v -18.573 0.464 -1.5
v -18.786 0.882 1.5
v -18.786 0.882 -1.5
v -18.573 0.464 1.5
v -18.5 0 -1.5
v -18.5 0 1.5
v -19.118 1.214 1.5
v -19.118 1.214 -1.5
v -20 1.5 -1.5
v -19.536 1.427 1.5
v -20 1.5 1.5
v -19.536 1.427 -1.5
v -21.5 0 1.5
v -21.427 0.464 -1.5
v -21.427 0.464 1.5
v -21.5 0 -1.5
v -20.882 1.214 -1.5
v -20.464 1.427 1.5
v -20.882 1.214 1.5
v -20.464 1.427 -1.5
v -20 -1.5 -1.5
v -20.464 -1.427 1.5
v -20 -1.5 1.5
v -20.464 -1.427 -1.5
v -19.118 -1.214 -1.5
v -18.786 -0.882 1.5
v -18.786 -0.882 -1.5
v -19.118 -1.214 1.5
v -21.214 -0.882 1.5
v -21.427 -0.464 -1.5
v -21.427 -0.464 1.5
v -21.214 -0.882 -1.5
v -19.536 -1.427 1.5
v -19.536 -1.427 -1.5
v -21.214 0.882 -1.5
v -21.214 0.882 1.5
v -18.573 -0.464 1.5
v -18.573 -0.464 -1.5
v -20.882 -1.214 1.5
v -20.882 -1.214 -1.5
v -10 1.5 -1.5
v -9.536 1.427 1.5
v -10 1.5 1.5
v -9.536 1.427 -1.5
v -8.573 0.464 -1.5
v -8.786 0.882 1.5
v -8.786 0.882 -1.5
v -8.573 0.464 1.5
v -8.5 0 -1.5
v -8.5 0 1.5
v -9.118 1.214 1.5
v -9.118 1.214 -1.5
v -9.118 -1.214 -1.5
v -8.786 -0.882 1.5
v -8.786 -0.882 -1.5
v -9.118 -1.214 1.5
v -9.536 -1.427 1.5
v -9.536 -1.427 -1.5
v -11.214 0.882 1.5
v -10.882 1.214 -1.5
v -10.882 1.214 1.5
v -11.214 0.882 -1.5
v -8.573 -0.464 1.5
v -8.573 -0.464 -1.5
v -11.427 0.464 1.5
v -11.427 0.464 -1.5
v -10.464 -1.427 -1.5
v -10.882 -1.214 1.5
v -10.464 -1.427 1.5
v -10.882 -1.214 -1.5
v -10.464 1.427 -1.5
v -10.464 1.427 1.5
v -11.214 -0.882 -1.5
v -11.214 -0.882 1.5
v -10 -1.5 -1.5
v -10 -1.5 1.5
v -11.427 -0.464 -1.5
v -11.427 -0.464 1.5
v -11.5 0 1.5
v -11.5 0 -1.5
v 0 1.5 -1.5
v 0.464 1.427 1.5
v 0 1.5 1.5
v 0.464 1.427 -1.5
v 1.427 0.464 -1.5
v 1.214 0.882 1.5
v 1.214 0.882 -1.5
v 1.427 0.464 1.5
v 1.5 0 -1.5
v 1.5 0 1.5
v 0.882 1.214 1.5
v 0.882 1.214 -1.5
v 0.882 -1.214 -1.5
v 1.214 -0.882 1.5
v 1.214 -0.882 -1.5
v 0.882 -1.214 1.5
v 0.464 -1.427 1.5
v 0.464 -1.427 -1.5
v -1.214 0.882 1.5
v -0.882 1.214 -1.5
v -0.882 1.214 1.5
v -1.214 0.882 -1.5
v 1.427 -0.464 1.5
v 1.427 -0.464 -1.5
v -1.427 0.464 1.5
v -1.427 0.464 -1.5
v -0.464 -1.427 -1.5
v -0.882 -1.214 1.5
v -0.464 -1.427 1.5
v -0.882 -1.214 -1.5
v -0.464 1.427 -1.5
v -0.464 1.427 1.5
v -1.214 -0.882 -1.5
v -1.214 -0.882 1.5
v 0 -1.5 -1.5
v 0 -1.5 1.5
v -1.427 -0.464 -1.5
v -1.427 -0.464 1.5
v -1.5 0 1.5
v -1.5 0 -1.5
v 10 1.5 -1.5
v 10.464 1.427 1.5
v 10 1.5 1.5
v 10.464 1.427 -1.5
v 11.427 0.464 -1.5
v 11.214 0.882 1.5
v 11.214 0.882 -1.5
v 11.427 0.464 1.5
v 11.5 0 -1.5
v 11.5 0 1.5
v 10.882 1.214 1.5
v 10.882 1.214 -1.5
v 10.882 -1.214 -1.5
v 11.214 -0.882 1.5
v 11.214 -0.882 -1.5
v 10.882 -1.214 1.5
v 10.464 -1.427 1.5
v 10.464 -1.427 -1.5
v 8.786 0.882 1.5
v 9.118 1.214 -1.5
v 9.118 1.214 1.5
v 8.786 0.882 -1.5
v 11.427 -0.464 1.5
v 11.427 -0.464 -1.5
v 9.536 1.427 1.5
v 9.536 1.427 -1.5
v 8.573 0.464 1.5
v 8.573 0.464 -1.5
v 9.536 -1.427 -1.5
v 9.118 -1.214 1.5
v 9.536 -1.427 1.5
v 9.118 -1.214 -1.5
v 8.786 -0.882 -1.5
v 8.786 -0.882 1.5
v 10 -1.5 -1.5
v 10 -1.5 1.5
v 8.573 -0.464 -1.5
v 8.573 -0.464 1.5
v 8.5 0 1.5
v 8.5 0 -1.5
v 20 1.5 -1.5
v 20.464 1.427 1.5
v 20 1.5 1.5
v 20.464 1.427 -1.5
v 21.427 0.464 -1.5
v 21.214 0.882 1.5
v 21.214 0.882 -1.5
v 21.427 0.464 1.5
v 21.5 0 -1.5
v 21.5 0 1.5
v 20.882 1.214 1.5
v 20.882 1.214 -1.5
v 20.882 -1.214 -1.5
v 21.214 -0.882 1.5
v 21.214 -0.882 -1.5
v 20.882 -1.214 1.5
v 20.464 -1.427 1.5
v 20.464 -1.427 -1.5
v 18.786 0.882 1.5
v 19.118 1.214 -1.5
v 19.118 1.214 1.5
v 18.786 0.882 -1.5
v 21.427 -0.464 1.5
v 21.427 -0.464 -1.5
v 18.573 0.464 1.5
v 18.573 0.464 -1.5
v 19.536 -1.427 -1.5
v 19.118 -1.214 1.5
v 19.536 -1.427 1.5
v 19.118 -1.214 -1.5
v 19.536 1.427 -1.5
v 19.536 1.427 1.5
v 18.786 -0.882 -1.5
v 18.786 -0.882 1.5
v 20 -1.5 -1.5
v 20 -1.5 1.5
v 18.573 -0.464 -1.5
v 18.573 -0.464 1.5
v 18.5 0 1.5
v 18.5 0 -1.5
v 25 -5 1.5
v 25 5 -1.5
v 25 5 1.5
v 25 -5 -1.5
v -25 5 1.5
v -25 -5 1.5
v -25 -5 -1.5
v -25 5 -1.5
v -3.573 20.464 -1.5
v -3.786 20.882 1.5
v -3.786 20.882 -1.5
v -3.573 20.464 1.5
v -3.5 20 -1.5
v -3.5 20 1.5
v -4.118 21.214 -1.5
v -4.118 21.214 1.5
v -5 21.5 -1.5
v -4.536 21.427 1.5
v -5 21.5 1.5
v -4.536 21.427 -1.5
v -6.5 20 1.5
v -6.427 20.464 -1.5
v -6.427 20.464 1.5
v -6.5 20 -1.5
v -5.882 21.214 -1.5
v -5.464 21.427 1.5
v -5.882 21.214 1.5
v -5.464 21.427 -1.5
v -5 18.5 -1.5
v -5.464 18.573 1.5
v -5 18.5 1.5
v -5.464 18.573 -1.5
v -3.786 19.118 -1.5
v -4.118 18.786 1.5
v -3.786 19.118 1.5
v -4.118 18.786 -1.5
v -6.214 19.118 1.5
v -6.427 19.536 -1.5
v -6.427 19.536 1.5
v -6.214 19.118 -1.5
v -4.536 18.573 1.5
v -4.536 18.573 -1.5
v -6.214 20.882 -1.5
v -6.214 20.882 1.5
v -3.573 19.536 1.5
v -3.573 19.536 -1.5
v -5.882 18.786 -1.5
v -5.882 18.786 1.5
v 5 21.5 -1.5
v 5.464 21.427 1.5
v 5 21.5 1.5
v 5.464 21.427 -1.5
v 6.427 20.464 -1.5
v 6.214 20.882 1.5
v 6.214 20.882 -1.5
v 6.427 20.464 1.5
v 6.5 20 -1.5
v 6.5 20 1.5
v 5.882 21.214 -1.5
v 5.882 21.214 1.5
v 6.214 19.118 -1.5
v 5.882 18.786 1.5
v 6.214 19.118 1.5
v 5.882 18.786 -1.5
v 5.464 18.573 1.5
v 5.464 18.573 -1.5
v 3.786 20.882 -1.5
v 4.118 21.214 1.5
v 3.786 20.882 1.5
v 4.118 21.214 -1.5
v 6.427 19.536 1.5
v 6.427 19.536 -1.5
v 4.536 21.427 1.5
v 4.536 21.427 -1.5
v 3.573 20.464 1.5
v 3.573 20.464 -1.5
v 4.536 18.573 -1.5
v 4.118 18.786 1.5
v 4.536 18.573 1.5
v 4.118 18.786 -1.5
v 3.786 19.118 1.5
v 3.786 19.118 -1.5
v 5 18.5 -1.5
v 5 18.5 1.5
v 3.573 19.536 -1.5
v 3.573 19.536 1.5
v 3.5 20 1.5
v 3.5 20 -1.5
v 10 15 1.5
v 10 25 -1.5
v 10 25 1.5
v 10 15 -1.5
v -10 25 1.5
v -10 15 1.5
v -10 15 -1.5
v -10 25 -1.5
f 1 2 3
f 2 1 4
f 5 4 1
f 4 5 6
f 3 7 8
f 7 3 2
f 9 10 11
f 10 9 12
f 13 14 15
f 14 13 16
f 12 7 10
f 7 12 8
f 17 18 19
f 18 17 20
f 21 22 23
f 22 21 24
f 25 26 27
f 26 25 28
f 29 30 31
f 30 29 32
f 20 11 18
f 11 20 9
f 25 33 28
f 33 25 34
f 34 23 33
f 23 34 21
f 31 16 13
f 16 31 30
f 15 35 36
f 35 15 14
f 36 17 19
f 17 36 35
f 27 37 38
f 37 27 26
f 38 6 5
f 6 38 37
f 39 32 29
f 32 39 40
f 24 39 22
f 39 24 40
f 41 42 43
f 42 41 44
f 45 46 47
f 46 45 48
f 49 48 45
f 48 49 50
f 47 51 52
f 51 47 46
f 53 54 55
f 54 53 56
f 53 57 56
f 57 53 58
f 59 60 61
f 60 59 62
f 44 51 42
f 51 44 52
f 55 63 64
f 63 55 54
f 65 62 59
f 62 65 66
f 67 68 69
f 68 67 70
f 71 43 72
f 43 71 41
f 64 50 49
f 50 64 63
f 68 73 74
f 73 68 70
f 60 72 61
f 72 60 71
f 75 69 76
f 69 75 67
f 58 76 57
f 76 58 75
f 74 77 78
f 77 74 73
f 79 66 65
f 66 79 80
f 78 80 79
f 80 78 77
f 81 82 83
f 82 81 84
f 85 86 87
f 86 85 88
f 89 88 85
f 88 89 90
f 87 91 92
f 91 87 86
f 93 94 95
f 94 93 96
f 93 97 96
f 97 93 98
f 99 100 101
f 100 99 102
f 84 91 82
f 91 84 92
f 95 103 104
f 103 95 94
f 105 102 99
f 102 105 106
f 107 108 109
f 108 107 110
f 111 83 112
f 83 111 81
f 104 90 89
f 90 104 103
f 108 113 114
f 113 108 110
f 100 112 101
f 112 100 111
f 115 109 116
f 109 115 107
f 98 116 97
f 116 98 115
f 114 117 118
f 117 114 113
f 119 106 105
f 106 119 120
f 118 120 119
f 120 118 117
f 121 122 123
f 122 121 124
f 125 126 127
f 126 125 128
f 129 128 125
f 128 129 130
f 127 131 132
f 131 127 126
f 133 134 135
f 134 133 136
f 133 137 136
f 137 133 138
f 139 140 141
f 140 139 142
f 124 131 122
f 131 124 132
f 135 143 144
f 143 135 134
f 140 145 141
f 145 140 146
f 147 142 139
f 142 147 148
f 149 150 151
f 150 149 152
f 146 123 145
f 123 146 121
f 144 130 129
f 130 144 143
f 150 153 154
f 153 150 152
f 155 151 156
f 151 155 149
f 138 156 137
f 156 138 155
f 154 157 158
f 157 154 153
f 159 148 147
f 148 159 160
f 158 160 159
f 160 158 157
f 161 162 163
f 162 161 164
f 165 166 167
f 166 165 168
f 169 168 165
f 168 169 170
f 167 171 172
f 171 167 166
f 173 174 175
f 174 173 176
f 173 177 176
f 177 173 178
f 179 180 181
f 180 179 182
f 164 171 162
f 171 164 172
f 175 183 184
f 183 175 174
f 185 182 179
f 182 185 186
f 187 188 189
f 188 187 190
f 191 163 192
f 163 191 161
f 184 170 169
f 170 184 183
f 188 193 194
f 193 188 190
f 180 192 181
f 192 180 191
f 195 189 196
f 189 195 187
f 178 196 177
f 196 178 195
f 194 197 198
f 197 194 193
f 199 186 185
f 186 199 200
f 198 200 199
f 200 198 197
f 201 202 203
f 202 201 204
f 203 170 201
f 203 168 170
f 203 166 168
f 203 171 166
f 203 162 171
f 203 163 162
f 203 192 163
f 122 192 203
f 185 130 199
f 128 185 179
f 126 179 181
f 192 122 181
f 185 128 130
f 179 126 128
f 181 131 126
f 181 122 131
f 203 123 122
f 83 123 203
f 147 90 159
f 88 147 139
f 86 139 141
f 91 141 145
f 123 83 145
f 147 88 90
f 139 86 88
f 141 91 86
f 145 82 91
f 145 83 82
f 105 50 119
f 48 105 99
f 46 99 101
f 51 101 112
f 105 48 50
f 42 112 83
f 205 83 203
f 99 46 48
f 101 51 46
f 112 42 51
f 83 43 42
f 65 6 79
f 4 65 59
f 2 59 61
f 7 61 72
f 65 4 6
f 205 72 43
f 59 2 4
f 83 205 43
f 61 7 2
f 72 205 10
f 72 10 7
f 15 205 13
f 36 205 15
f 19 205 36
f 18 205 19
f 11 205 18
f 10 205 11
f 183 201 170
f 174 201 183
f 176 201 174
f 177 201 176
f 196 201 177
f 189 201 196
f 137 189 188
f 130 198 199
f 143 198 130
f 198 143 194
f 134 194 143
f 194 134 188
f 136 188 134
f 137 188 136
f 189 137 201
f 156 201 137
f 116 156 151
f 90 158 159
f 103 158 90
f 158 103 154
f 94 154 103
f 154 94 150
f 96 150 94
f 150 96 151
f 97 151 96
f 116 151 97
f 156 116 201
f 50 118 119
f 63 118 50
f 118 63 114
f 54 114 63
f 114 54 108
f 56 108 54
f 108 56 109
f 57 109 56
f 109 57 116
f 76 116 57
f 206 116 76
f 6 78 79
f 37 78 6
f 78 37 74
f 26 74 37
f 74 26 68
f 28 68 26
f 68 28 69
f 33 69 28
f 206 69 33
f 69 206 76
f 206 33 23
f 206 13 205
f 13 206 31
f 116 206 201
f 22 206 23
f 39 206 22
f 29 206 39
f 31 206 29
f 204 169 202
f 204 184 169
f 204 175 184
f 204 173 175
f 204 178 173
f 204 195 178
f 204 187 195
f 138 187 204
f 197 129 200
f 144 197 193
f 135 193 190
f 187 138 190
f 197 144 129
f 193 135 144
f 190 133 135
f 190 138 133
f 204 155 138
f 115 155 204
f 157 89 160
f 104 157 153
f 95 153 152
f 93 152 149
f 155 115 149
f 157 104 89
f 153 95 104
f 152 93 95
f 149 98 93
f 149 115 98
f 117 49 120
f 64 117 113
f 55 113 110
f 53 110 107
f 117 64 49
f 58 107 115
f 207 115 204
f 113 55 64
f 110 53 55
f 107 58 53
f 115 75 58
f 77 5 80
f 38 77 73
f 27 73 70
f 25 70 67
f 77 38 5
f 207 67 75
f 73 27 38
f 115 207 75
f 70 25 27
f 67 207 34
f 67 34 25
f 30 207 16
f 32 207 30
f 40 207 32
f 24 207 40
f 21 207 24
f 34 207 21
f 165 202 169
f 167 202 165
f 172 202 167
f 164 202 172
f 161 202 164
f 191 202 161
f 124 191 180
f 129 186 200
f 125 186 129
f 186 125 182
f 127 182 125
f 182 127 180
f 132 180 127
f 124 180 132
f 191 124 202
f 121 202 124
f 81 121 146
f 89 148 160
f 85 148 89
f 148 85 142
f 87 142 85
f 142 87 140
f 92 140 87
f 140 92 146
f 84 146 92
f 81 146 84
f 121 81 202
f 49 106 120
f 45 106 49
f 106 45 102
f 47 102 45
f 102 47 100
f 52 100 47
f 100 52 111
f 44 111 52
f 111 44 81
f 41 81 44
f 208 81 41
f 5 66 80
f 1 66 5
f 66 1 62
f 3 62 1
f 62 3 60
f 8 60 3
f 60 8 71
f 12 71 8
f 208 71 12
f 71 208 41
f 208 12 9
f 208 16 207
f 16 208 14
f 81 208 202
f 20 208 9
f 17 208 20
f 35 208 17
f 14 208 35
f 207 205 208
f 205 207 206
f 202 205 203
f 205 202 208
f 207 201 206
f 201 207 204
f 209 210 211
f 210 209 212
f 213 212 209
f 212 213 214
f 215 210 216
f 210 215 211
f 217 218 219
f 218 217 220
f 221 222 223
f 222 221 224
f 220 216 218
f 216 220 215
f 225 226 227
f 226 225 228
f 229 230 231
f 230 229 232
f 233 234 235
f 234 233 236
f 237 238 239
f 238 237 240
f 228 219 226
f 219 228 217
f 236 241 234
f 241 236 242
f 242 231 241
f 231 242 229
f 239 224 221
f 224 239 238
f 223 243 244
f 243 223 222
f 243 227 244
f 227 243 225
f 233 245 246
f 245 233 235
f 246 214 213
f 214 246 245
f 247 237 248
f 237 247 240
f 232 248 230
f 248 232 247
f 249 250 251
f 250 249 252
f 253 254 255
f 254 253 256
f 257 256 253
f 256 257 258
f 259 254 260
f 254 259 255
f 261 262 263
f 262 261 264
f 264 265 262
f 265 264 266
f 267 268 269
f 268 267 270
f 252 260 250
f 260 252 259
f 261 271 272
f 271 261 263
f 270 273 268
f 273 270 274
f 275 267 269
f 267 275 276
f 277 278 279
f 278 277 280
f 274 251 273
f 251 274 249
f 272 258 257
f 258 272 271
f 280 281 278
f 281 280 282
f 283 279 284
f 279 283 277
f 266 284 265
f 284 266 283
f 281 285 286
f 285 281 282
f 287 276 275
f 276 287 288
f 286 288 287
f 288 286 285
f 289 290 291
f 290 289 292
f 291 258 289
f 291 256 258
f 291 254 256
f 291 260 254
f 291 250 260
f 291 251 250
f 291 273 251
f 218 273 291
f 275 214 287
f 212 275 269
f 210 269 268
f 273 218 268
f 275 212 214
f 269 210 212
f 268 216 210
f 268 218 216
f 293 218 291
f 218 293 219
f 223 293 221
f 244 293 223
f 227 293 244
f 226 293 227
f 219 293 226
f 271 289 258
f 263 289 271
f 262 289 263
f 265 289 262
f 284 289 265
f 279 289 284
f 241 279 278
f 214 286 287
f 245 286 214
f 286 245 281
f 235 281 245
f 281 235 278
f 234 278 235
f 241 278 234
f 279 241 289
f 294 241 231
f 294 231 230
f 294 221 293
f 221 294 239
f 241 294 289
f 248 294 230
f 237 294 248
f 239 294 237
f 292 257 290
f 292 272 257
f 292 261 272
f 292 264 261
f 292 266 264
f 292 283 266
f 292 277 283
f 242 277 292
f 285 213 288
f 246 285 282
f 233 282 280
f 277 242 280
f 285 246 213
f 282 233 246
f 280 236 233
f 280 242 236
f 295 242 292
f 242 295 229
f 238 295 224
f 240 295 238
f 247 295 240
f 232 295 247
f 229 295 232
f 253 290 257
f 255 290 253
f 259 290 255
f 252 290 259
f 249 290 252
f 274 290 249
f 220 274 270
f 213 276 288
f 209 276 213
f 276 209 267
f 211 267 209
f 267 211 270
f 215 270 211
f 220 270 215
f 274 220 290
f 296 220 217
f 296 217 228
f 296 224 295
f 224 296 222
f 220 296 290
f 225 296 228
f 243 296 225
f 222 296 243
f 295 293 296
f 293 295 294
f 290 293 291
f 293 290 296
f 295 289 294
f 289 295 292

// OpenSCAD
module pieza_mecano(drill=3, d=10, n=4, anchura=10,grosor=3){
  
    //-- Calcular la longitud de la pieza
    lx= n*d;

    //--Construimos la pieza
    difference(){
        //-- Cuerpo de la pieza
        cube([lx,anchura,grosor],center=true);
    
        //-- Taladros
        translate([-lx/2+d/2,0,0])
        for(i=[0:n-1]){ 
            translate([i*d,0,0])
                cylinder(r=drill/2, h=grosor+5, $fn=20, center=true);
    }
    }
}

//-- Ejemplos de utilización
color("red")
pieza_mecano(n=5);

color("green")
translate([0,20,0])
    pieza_mecano(n=2);
